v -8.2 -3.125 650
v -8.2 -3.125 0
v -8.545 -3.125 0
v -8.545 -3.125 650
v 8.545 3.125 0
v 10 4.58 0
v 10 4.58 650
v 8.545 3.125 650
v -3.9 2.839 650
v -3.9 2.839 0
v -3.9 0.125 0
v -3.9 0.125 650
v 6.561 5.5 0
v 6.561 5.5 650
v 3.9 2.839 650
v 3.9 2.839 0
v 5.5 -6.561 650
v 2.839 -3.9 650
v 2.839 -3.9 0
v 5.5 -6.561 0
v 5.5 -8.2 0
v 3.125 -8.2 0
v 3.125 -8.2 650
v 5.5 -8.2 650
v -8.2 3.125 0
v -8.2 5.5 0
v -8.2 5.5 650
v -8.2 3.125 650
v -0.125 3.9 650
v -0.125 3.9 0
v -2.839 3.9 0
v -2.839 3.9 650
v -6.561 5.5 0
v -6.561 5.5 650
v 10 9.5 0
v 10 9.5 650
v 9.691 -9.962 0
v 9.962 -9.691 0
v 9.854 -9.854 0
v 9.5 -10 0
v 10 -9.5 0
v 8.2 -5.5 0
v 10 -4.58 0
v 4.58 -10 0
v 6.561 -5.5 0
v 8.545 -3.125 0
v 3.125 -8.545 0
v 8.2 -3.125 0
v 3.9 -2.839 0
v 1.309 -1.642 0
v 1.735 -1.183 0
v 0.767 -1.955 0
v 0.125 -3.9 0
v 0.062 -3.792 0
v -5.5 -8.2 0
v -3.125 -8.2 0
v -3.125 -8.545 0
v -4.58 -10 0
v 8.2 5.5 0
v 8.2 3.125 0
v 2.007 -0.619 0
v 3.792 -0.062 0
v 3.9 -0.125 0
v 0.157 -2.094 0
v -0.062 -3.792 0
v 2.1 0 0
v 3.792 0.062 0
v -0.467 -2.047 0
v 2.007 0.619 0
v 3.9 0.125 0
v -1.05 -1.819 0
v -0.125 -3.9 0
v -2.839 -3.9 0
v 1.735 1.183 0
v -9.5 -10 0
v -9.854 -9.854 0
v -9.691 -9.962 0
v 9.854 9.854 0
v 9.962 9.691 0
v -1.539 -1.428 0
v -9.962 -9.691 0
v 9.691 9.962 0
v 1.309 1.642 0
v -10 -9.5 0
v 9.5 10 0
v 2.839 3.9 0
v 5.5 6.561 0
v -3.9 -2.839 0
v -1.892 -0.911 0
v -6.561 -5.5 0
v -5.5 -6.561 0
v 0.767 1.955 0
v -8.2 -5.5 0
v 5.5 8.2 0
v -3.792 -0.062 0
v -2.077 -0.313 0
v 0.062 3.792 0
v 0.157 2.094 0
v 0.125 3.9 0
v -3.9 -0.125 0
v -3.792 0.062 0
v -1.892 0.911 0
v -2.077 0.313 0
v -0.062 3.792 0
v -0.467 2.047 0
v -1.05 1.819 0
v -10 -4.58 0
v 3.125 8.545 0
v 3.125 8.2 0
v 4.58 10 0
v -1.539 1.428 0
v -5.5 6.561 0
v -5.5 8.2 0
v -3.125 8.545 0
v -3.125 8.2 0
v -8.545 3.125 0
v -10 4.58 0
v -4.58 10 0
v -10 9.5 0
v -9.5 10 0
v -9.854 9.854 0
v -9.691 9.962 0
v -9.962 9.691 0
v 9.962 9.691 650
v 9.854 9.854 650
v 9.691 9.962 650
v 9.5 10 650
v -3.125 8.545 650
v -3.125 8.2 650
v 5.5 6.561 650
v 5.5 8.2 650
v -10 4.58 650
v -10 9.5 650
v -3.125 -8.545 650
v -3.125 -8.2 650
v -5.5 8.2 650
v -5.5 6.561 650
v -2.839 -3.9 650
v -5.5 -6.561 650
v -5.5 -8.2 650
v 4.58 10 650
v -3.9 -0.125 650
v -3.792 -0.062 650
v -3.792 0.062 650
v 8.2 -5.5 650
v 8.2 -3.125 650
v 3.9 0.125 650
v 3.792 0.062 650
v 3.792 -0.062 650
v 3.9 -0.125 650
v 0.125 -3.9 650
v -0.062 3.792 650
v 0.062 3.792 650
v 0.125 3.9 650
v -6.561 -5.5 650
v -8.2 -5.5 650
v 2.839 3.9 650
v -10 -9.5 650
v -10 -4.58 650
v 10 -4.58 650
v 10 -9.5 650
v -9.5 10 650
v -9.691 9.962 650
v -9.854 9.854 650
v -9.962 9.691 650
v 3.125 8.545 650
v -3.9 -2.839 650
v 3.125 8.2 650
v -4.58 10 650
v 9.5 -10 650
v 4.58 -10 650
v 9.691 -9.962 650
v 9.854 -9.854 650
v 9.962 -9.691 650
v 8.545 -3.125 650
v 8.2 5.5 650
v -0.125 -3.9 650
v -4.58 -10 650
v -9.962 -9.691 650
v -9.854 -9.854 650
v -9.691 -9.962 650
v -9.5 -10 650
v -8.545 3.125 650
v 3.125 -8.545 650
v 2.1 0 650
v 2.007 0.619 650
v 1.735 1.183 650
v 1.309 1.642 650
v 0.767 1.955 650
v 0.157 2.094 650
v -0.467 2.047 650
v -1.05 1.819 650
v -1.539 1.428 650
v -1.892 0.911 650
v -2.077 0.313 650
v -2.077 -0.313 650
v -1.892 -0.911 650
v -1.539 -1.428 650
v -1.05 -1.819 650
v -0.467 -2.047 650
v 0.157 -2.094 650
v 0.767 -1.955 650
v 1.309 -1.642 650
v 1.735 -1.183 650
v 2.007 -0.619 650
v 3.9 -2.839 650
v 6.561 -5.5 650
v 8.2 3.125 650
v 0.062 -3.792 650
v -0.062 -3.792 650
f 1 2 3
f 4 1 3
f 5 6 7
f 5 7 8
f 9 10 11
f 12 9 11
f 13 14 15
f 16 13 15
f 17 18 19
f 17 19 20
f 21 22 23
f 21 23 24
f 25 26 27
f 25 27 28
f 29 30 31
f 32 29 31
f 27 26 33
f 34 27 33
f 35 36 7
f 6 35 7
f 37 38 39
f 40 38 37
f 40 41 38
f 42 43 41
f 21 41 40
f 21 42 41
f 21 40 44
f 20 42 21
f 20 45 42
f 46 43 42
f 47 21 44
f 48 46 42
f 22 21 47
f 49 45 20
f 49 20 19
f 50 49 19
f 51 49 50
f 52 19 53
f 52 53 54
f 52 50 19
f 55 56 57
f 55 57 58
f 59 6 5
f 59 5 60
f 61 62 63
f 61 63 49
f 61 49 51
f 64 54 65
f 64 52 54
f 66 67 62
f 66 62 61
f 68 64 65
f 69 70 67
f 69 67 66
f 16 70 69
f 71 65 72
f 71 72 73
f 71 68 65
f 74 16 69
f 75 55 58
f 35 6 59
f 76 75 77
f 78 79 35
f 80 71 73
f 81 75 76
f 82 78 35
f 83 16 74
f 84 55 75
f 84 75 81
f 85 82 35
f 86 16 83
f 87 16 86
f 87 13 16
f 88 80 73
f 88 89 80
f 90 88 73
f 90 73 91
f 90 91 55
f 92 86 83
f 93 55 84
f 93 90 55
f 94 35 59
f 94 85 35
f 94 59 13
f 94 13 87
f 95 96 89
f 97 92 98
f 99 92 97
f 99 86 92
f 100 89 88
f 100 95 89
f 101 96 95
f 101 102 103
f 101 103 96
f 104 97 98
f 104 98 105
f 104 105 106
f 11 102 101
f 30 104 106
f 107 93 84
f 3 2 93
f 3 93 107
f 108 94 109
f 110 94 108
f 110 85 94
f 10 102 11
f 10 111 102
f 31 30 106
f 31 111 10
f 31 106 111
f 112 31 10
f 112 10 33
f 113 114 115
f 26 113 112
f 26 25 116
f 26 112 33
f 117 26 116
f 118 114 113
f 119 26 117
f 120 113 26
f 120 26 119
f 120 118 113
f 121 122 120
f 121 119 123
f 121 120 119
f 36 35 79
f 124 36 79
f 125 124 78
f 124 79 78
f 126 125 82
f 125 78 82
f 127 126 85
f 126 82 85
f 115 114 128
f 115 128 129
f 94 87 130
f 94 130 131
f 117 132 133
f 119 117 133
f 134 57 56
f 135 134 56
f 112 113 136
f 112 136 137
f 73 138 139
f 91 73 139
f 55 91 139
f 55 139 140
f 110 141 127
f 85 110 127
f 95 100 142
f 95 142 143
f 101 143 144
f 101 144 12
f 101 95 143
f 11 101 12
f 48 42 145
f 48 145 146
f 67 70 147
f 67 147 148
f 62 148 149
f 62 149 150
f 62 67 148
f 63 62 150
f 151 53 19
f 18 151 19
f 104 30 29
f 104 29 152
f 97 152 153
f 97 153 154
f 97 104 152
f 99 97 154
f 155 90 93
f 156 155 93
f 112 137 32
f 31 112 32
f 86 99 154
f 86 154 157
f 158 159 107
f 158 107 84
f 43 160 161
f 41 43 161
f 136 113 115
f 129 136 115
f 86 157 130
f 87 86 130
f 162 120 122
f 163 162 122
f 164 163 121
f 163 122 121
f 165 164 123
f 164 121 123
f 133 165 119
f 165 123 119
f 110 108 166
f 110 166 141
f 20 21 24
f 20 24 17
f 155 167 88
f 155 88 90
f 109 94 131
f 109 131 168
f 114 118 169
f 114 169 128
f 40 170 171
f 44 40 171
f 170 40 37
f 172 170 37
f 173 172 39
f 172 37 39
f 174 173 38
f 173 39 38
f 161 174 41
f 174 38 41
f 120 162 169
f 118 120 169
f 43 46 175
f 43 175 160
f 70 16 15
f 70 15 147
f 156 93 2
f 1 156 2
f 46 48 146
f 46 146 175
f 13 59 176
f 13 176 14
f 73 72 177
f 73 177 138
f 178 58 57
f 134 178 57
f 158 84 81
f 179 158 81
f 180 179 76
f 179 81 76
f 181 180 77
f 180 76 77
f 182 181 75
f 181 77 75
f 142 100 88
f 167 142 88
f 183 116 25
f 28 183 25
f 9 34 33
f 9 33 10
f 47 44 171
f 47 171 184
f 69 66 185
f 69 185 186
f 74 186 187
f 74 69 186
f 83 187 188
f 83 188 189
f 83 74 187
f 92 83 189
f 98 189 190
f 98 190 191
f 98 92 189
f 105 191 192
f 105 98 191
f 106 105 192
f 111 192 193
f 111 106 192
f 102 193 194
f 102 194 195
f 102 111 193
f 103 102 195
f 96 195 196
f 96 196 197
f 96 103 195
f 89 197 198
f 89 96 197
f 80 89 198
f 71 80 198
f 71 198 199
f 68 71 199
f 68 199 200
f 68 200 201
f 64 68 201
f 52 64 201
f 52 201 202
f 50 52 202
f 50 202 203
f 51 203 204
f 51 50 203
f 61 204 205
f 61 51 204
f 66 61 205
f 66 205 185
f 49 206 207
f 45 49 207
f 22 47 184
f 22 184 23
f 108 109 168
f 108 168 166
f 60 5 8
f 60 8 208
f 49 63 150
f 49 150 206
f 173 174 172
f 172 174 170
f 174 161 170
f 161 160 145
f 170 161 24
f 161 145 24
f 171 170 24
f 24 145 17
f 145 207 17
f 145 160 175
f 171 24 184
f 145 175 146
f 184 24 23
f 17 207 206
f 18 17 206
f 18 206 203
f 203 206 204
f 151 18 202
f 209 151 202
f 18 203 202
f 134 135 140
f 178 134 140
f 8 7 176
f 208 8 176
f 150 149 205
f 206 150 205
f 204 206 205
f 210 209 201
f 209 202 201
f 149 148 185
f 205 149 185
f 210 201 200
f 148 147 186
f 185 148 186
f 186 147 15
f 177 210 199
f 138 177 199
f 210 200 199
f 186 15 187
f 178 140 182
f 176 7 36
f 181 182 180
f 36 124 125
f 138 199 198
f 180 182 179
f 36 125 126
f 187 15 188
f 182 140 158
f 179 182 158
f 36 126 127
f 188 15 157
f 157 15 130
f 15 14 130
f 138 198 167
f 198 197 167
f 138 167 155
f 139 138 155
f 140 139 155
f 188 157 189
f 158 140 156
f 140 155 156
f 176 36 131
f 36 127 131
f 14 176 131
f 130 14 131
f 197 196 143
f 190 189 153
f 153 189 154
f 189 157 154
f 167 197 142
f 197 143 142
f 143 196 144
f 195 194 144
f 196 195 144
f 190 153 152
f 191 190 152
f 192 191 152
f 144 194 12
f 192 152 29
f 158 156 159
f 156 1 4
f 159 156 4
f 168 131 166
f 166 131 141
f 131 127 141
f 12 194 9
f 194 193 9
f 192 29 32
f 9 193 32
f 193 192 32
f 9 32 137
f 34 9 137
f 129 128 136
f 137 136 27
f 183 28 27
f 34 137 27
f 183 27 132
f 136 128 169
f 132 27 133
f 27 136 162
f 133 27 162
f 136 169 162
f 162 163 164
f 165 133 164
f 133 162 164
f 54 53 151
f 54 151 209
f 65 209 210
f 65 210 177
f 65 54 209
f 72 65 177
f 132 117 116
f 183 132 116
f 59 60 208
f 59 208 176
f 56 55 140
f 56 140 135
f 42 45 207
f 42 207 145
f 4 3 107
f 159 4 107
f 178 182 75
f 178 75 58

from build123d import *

# Parameters (mm, degrees)
SKETCH_R  = 2.1
PAD_DEPTH = 650


with BuildPart() as part:
    # Sketch → Pad (new body)
    with BuildSketch(Plane.XY):
        with BuildLine():
            Line((-10, 4.58), (-10, 9.5))
            ThreePointArc((-9.5, 10), (-9.853553, 9.853553), (-10, 9.5))
            Line((-9.5, 10), (-4.58, 10))
            Line((-4.58, 10), (-3.125, 8.545))
            Line((-3.125, 8.545), (-3.125, 8.2))
            Line((-5.5, 8.2), (-3.125, 8.2))
            Line((-5.5, 8.2), (-5.5, 6.56066))
            Line((-5.5, 6.56066), (-2.83934, 3.9))
            Line((-0.125, 3.9), (-2.83934, 3.9))
            ThreePointArc((-0.125, 3.9), (0, 3.775), (0.125, 3.9))
            Line((0.125, 3.9), (2.83934, 3.9))
            Line((2.83934, 3.9), (5.5, 6.56066))
            Line((5.5, 6.56066), (5.5, 8.2))
            Line((5.5, 8.2), (3.125, 8.2))
            Line((3.125, 8.2), (3.125, 8.545))
            Line((3.125, 8.545), (4.58, 10))
            Line((4.58, 10), (9.5, 10))
            ThreePointArc((10, 9.5), (9.853553, 9.853553), (9.5, 10))
            Line((10, 9.5), (10, 4.58))
            Line((10, 4.58), (8.545, 3.125))
            Line((8.545, 3.125), (8.2, 3.125))
            Line((8.2, 3.125), (8.2, 5.5))
            Line((8.2, 5.5), (6.56066, 5.5))
            Line((6.56066, 5.5), (3.9, 2.83934))
            Line((3.9, 2.83934), (3.9, 0.125))
            ThreePointArc((3.9, 0.125), (3.775, 0), (3.9, -0.125))
            Line((3.9, -0.125), (3.9, -2.83934))
            Line((3.9, -2.83934), (6.56066, -5.5))
            Line((6.56066, -5.5), (8.2, -5.5))
            Line((8.2, -5.5), (8.2, -3.125))
            Line((8.2, -3.125), (8.545, -3.125))
            Line((8.545, -3.125), (10, -4.58))
            Line((10, -4.58), (10, -9.5))
            ThreePointArc((9.5, -10), (9.853553, -9.853553), (10, -9.5))
            Line((9.5, -10), (4.58, -10))
            Line((4.58, -10), (3.125, -8.545))
            Line((3.125, -8.545), (3.125, -8.2))
            Line((3.125, -8.2), (5.5, -8.2))
            Line((5.5, -8.2), (5.5, -6.56066))
            Line((2.83934, -3.9), (5.5, -6.56066))
            Line((0.125, -3.9), (2.83934, -3.9))
            ThreePointArc((0.125, -3.9), (0, -3.775), (-0.125, -3.9))
            Line((-0.125, -3.9), (-2.83934, -3.9))
            Line((-2.83934, -3.9), (-5.5, -6.56066))
            Line((-5.5, -6.56066), (-5.5, -8.2))
            Line((-5.5, -8.2), (-3.125, -8.2))
            Line((-3.125, -8.545), (-3.125, -8.2))
            Line((-4.58, -10), (-3.125, -8.545))
            Line((-9.5, -10), (-4.58, -10))
            ThreePointArc((-10, -9.5), (-9.853553, -9.853553), (-9.5, -10))
            Line((-10, -4.58), (-10, -9.5))
            Line((-8.545, -3.125), (-10, -4.58))
            Line((-8.2, -3.125), (-8.545, -3.125))
            Line((-8.2, -5.5), (-8.2, -3.125))
            Line((-6.56066, -5.5), (-8.2, -5.5))
            Line((-3.9, -2.83934), (-6.56066, -5.5))
            Line((-3.9, -0.125), (-3.9, -2.83934))
            ThreePointArc((-3.9, -0.125), (-3.775, 0), (-3.9, 0.125))
            Line((-3.9, 2.83934), (-3.9, 0.125))
            Line((-6.56066, 5.5), (-3.9, 2.83934))
            Line((-8.2, 5.5), (-6.56066, 5.5))
            Line((-8.2, 5.5), (-8.2, 3.125))
            Line((-8.545, 3.125), (-8.2, 3.125))
            Line((-10, 4.58), (-8.545, 3.125))
        make_face()
        Circle(SKETCH_R, mode=Mode.SUBTRACT)
    extrude(amount=PAD_DEPTH)


solid = part.part
